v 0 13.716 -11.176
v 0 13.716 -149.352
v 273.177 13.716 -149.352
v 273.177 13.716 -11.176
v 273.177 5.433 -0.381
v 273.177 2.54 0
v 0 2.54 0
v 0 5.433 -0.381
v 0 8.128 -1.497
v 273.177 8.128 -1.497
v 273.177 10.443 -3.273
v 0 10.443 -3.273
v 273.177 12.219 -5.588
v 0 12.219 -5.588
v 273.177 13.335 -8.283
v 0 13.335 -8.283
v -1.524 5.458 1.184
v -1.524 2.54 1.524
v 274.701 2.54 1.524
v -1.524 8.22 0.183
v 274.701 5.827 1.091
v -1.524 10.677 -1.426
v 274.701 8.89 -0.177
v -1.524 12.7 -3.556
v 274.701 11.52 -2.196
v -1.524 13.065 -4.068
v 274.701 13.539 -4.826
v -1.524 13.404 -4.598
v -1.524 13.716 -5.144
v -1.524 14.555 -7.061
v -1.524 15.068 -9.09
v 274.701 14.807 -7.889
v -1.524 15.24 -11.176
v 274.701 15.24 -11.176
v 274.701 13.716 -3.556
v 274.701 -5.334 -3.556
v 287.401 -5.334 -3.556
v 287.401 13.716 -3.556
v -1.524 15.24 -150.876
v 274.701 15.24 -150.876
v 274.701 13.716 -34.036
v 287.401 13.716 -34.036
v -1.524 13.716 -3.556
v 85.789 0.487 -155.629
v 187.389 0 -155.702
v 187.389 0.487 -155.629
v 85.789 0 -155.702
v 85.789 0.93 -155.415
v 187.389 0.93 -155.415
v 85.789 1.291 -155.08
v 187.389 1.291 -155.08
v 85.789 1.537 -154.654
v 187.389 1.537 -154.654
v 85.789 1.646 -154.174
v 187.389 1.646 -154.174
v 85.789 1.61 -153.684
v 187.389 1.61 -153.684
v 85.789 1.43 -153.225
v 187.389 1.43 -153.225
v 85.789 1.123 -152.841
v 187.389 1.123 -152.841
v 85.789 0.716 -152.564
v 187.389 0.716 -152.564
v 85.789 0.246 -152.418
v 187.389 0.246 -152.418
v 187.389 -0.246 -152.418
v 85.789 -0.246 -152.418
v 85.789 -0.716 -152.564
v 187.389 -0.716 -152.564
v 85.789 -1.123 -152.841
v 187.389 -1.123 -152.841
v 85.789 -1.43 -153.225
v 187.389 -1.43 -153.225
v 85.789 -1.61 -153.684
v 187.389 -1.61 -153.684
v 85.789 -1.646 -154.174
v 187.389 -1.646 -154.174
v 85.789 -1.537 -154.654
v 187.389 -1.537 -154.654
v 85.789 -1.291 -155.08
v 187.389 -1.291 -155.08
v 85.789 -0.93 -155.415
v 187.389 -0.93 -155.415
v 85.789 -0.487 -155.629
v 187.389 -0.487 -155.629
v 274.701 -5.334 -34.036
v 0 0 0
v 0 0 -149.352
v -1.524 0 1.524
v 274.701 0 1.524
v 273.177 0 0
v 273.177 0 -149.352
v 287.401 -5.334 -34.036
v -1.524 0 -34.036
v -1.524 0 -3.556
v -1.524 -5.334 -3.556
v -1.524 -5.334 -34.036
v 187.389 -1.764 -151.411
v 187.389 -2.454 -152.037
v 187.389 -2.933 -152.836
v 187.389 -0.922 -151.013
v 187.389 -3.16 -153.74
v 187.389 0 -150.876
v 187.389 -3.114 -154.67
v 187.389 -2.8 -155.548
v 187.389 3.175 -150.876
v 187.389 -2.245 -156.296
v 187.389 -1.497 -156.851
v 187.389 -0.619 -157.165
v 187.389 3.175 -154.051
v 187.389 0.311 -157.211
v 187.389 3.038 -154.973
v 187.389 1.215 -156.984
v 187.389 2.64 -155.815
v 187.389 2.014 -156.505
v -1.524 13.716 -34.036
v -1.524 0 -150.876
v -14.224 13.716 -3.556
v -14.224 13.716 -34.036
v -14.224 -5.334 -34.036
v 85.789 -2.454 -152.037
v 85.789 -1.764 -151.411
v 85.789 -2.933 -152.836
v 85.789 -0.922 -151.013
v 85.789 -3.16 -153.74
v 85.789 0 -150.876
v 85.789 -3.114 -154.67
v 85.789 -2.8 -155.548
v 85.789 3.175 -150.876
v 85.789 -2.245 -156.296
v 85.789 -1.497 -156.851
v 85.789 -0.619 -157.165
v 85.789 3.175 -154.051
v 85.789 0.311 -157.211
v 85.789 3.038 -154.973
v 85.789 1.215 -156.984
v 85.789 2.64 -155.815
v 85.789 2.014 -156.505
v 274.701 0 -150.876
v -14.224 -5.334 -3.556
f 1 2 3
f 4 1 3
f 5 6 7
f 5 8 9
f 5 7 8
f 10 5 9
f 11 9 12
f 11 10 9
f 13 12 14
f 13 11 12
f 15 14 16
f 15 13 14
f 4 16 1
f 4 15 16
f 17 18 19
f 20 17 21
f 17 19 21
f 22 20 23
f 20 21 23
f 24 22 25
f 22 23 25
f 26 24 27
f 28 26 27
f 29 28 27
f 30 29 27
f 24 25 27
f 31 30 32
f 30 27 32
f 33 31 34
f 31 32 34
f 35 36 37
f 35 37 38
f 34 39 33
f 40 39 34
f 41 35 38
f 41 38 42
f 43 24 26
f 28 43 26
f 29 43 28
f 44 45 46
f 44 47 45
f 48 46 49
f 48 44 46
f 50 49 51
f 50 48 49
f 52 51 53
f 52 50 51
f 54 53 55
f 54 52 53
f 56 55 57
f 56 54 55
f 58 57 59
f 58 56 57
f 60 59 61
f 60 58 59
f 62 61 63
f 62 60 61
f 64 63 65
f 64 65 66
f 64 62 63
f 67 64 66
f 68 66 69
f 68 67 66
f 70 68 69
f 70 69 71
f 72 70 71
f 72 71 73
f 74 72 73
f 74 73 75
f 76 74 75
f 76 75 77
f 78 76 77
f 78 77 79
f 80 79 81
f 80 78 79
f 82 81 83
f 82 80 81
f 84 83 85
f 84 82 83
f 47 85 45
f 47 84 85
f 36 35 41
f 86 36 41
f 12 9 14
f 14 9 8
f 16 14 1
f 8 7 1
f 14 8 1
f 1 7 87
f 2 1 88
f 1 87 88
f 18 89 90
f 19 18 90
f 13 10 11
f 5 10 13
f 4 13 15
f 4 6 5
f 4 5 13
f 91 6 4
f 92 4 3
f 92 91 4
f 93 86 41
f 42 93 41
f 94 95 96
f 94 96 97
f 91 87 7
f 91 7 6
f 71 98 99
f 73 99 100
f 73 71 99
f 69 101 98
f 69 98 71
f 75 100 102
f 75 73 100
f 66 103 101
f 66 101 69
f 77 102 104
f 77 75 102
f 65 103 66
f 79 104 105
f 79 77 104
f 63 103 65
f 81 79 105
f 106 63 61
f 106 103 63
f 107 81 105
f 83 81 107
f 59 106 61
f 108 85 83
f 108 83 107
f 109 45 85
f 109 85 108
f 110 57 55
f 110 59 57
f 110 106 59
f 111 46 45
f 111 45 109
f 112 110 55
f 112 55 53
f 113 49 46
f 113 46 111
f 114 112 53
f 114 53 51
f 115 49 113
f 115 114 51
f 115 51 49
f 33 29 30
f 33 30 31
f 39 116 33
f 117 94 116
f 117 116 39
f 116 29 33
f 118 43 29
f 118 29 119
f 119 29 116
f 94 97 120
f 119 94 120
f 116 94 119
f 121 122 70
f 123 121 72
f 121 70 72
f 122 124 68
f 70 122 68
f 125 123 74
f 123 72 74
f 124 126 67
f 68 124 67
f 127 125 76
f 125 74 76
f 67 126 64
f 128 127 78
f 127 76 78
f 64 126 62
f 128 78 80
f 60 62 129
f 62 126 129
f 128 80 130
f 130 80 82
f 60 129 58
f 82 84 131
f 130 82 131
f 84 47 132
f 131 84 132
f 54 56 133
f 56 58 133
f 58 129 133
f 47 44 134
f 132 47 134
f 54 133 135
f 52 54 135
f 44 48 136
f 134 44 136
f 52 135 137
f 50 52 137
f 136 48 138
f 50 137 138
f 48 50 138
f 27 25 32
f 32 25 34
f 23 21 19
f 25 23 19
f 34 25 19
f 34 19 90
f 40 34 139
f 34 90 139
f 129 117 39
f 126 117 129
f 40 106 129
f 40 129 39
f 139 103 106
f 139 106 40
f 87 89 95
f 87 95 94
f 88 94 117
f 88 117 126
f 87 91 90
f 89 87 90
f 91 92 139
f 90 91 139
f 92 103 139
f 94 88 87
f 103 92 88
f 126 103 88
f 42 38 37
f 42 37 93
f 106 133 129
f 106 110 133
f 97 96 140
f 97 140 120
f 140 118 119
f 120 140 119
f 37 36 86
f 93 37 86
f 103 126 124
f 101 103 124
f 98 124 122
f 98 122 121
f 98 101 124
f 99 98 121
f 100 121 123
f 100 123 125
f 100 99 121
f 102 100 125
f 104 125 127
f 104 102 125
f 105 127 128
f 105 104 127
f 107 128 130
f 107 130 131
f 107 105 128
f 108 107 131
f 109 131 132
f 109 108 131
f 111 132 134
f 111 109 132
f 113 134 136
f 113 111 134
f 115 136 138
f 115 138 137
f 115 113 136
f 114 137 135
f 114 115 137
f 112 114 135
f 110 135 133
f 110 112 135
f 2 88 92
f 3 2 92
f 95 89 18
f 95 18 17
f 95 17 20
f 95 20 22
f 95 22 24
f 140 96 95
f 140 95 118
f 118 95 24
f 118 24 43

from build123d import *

# Parameters (mm, degrees)
SKETCH1_W                            = 276.225
SKETCH1_H                            = 152.4
SKETCH1_W_2                          = 273.177
SKETCH1_H_2                          = 149.352
BULK_EXTRUDE_DEPTH                   = 15.24
FILLET1_R                            = 12.7
SHELL_T                              = -1.524
SKETCH2_R                            = 1.651
BOSS_EXTRUDE3_DEPTH                  = 50.8
SKETCH3_W                            = 30.48
SKETCH3_H                            = 19.05
LATCH_CLEAR_HOOK_RIGHT_EXTRUDE_DEPTH = 12.7


with BuildPart() as part:
    # Sketch1 → Bulk-Extrude (new body)
    with BuildSketch(Plane(origin=(0, 0, 0), x_dir=(1, 0, 0), z_dir=(0, 1, 0))):
        with Locations((136.5885, 74.676)):
            Rectangle(SKETCH1_W, SKETCH1_H)
        with Locations((136.5885, 74.676)):
            Rectangle(SKETCH1_W_2, SKETCH1_H_2, mode=Mode.SUBTRACT)
        with Locations((136.5885, 74.676)):
            Rectangle(SKETCH1_W_2, SKETCH1_H_2)
    extrude(amount=BULK_EXTRUDE_DEPTH)

    # Fillet1
    fillet1_edges = [part.edges().sort_by_distance(p)[0] for p in [
        (136.5885, 15.24, 1.524),
    ]]
    fillet(fillet1_edges, radius=FILLET1_R)

    # Shell
    shell_openings = [part.faces().sort_by_distance(p)[0] for p in [
        (136.5885, 0, -74.676),
    ]]
    offset(amount=SHELL_T, openings=shell_openings, kind=Kind.INTERSECTION)

    # Sketch2 → Boss-Extrude3 (add, symmetric)
    with BuildSketch(Plane(origin=(136.5885, 0, 0), x_dir=(0, 0, -1), z_dir=(1, 0, 0))):
        with BuildLine():
            Line((150.876, 3.175), (150.876, 0))
            ThreePointArc((150.876, 0), (156.29606403, -2.24506403), (154.051, 3.175))
            Line((154.051, 3.175), (150.876, 3.175))
        make_face()
        with Locations((154.051, 0)):
            Circle(SKETCH2_R, mode=Mode.SUBTRACT)
    extrude(amount=BOSS_EXTRUDE3_DEPTH, both=True)


with BuildPart() as body_2:
    # Sketch3 → Latch Clear. Hook, Right-Extrude (new body)
    with BuildSketch(Plane(origin=(274.701, 0, 0), x_dir=(0, 0, -1), z_dir=(1, 0, 0))):
        with Locations((18.796, 4.191)):
            Rectangle(SKETCH3_W, SKETCH3_H)
    latch_clear_hook_right_extrude = extrude(amount=LATCH_CLEAR_HOOK_RIGHT_EXTRUDE_DEPTH)


with BuildPart() as part_1:
    add(part.part)

    # Latch Clear. Hook, Left-Mirror: Latch Clear. Hook, Right-Extrude across plane
    add(latch_clear_hook_right_extrude.mirror(Plane(origin=(136.5885, 0, 0), x_dir=(0, 0, 1), z_dir=(1, 0, 0))))


solid = Compound([body_2.part, part_1.part])
